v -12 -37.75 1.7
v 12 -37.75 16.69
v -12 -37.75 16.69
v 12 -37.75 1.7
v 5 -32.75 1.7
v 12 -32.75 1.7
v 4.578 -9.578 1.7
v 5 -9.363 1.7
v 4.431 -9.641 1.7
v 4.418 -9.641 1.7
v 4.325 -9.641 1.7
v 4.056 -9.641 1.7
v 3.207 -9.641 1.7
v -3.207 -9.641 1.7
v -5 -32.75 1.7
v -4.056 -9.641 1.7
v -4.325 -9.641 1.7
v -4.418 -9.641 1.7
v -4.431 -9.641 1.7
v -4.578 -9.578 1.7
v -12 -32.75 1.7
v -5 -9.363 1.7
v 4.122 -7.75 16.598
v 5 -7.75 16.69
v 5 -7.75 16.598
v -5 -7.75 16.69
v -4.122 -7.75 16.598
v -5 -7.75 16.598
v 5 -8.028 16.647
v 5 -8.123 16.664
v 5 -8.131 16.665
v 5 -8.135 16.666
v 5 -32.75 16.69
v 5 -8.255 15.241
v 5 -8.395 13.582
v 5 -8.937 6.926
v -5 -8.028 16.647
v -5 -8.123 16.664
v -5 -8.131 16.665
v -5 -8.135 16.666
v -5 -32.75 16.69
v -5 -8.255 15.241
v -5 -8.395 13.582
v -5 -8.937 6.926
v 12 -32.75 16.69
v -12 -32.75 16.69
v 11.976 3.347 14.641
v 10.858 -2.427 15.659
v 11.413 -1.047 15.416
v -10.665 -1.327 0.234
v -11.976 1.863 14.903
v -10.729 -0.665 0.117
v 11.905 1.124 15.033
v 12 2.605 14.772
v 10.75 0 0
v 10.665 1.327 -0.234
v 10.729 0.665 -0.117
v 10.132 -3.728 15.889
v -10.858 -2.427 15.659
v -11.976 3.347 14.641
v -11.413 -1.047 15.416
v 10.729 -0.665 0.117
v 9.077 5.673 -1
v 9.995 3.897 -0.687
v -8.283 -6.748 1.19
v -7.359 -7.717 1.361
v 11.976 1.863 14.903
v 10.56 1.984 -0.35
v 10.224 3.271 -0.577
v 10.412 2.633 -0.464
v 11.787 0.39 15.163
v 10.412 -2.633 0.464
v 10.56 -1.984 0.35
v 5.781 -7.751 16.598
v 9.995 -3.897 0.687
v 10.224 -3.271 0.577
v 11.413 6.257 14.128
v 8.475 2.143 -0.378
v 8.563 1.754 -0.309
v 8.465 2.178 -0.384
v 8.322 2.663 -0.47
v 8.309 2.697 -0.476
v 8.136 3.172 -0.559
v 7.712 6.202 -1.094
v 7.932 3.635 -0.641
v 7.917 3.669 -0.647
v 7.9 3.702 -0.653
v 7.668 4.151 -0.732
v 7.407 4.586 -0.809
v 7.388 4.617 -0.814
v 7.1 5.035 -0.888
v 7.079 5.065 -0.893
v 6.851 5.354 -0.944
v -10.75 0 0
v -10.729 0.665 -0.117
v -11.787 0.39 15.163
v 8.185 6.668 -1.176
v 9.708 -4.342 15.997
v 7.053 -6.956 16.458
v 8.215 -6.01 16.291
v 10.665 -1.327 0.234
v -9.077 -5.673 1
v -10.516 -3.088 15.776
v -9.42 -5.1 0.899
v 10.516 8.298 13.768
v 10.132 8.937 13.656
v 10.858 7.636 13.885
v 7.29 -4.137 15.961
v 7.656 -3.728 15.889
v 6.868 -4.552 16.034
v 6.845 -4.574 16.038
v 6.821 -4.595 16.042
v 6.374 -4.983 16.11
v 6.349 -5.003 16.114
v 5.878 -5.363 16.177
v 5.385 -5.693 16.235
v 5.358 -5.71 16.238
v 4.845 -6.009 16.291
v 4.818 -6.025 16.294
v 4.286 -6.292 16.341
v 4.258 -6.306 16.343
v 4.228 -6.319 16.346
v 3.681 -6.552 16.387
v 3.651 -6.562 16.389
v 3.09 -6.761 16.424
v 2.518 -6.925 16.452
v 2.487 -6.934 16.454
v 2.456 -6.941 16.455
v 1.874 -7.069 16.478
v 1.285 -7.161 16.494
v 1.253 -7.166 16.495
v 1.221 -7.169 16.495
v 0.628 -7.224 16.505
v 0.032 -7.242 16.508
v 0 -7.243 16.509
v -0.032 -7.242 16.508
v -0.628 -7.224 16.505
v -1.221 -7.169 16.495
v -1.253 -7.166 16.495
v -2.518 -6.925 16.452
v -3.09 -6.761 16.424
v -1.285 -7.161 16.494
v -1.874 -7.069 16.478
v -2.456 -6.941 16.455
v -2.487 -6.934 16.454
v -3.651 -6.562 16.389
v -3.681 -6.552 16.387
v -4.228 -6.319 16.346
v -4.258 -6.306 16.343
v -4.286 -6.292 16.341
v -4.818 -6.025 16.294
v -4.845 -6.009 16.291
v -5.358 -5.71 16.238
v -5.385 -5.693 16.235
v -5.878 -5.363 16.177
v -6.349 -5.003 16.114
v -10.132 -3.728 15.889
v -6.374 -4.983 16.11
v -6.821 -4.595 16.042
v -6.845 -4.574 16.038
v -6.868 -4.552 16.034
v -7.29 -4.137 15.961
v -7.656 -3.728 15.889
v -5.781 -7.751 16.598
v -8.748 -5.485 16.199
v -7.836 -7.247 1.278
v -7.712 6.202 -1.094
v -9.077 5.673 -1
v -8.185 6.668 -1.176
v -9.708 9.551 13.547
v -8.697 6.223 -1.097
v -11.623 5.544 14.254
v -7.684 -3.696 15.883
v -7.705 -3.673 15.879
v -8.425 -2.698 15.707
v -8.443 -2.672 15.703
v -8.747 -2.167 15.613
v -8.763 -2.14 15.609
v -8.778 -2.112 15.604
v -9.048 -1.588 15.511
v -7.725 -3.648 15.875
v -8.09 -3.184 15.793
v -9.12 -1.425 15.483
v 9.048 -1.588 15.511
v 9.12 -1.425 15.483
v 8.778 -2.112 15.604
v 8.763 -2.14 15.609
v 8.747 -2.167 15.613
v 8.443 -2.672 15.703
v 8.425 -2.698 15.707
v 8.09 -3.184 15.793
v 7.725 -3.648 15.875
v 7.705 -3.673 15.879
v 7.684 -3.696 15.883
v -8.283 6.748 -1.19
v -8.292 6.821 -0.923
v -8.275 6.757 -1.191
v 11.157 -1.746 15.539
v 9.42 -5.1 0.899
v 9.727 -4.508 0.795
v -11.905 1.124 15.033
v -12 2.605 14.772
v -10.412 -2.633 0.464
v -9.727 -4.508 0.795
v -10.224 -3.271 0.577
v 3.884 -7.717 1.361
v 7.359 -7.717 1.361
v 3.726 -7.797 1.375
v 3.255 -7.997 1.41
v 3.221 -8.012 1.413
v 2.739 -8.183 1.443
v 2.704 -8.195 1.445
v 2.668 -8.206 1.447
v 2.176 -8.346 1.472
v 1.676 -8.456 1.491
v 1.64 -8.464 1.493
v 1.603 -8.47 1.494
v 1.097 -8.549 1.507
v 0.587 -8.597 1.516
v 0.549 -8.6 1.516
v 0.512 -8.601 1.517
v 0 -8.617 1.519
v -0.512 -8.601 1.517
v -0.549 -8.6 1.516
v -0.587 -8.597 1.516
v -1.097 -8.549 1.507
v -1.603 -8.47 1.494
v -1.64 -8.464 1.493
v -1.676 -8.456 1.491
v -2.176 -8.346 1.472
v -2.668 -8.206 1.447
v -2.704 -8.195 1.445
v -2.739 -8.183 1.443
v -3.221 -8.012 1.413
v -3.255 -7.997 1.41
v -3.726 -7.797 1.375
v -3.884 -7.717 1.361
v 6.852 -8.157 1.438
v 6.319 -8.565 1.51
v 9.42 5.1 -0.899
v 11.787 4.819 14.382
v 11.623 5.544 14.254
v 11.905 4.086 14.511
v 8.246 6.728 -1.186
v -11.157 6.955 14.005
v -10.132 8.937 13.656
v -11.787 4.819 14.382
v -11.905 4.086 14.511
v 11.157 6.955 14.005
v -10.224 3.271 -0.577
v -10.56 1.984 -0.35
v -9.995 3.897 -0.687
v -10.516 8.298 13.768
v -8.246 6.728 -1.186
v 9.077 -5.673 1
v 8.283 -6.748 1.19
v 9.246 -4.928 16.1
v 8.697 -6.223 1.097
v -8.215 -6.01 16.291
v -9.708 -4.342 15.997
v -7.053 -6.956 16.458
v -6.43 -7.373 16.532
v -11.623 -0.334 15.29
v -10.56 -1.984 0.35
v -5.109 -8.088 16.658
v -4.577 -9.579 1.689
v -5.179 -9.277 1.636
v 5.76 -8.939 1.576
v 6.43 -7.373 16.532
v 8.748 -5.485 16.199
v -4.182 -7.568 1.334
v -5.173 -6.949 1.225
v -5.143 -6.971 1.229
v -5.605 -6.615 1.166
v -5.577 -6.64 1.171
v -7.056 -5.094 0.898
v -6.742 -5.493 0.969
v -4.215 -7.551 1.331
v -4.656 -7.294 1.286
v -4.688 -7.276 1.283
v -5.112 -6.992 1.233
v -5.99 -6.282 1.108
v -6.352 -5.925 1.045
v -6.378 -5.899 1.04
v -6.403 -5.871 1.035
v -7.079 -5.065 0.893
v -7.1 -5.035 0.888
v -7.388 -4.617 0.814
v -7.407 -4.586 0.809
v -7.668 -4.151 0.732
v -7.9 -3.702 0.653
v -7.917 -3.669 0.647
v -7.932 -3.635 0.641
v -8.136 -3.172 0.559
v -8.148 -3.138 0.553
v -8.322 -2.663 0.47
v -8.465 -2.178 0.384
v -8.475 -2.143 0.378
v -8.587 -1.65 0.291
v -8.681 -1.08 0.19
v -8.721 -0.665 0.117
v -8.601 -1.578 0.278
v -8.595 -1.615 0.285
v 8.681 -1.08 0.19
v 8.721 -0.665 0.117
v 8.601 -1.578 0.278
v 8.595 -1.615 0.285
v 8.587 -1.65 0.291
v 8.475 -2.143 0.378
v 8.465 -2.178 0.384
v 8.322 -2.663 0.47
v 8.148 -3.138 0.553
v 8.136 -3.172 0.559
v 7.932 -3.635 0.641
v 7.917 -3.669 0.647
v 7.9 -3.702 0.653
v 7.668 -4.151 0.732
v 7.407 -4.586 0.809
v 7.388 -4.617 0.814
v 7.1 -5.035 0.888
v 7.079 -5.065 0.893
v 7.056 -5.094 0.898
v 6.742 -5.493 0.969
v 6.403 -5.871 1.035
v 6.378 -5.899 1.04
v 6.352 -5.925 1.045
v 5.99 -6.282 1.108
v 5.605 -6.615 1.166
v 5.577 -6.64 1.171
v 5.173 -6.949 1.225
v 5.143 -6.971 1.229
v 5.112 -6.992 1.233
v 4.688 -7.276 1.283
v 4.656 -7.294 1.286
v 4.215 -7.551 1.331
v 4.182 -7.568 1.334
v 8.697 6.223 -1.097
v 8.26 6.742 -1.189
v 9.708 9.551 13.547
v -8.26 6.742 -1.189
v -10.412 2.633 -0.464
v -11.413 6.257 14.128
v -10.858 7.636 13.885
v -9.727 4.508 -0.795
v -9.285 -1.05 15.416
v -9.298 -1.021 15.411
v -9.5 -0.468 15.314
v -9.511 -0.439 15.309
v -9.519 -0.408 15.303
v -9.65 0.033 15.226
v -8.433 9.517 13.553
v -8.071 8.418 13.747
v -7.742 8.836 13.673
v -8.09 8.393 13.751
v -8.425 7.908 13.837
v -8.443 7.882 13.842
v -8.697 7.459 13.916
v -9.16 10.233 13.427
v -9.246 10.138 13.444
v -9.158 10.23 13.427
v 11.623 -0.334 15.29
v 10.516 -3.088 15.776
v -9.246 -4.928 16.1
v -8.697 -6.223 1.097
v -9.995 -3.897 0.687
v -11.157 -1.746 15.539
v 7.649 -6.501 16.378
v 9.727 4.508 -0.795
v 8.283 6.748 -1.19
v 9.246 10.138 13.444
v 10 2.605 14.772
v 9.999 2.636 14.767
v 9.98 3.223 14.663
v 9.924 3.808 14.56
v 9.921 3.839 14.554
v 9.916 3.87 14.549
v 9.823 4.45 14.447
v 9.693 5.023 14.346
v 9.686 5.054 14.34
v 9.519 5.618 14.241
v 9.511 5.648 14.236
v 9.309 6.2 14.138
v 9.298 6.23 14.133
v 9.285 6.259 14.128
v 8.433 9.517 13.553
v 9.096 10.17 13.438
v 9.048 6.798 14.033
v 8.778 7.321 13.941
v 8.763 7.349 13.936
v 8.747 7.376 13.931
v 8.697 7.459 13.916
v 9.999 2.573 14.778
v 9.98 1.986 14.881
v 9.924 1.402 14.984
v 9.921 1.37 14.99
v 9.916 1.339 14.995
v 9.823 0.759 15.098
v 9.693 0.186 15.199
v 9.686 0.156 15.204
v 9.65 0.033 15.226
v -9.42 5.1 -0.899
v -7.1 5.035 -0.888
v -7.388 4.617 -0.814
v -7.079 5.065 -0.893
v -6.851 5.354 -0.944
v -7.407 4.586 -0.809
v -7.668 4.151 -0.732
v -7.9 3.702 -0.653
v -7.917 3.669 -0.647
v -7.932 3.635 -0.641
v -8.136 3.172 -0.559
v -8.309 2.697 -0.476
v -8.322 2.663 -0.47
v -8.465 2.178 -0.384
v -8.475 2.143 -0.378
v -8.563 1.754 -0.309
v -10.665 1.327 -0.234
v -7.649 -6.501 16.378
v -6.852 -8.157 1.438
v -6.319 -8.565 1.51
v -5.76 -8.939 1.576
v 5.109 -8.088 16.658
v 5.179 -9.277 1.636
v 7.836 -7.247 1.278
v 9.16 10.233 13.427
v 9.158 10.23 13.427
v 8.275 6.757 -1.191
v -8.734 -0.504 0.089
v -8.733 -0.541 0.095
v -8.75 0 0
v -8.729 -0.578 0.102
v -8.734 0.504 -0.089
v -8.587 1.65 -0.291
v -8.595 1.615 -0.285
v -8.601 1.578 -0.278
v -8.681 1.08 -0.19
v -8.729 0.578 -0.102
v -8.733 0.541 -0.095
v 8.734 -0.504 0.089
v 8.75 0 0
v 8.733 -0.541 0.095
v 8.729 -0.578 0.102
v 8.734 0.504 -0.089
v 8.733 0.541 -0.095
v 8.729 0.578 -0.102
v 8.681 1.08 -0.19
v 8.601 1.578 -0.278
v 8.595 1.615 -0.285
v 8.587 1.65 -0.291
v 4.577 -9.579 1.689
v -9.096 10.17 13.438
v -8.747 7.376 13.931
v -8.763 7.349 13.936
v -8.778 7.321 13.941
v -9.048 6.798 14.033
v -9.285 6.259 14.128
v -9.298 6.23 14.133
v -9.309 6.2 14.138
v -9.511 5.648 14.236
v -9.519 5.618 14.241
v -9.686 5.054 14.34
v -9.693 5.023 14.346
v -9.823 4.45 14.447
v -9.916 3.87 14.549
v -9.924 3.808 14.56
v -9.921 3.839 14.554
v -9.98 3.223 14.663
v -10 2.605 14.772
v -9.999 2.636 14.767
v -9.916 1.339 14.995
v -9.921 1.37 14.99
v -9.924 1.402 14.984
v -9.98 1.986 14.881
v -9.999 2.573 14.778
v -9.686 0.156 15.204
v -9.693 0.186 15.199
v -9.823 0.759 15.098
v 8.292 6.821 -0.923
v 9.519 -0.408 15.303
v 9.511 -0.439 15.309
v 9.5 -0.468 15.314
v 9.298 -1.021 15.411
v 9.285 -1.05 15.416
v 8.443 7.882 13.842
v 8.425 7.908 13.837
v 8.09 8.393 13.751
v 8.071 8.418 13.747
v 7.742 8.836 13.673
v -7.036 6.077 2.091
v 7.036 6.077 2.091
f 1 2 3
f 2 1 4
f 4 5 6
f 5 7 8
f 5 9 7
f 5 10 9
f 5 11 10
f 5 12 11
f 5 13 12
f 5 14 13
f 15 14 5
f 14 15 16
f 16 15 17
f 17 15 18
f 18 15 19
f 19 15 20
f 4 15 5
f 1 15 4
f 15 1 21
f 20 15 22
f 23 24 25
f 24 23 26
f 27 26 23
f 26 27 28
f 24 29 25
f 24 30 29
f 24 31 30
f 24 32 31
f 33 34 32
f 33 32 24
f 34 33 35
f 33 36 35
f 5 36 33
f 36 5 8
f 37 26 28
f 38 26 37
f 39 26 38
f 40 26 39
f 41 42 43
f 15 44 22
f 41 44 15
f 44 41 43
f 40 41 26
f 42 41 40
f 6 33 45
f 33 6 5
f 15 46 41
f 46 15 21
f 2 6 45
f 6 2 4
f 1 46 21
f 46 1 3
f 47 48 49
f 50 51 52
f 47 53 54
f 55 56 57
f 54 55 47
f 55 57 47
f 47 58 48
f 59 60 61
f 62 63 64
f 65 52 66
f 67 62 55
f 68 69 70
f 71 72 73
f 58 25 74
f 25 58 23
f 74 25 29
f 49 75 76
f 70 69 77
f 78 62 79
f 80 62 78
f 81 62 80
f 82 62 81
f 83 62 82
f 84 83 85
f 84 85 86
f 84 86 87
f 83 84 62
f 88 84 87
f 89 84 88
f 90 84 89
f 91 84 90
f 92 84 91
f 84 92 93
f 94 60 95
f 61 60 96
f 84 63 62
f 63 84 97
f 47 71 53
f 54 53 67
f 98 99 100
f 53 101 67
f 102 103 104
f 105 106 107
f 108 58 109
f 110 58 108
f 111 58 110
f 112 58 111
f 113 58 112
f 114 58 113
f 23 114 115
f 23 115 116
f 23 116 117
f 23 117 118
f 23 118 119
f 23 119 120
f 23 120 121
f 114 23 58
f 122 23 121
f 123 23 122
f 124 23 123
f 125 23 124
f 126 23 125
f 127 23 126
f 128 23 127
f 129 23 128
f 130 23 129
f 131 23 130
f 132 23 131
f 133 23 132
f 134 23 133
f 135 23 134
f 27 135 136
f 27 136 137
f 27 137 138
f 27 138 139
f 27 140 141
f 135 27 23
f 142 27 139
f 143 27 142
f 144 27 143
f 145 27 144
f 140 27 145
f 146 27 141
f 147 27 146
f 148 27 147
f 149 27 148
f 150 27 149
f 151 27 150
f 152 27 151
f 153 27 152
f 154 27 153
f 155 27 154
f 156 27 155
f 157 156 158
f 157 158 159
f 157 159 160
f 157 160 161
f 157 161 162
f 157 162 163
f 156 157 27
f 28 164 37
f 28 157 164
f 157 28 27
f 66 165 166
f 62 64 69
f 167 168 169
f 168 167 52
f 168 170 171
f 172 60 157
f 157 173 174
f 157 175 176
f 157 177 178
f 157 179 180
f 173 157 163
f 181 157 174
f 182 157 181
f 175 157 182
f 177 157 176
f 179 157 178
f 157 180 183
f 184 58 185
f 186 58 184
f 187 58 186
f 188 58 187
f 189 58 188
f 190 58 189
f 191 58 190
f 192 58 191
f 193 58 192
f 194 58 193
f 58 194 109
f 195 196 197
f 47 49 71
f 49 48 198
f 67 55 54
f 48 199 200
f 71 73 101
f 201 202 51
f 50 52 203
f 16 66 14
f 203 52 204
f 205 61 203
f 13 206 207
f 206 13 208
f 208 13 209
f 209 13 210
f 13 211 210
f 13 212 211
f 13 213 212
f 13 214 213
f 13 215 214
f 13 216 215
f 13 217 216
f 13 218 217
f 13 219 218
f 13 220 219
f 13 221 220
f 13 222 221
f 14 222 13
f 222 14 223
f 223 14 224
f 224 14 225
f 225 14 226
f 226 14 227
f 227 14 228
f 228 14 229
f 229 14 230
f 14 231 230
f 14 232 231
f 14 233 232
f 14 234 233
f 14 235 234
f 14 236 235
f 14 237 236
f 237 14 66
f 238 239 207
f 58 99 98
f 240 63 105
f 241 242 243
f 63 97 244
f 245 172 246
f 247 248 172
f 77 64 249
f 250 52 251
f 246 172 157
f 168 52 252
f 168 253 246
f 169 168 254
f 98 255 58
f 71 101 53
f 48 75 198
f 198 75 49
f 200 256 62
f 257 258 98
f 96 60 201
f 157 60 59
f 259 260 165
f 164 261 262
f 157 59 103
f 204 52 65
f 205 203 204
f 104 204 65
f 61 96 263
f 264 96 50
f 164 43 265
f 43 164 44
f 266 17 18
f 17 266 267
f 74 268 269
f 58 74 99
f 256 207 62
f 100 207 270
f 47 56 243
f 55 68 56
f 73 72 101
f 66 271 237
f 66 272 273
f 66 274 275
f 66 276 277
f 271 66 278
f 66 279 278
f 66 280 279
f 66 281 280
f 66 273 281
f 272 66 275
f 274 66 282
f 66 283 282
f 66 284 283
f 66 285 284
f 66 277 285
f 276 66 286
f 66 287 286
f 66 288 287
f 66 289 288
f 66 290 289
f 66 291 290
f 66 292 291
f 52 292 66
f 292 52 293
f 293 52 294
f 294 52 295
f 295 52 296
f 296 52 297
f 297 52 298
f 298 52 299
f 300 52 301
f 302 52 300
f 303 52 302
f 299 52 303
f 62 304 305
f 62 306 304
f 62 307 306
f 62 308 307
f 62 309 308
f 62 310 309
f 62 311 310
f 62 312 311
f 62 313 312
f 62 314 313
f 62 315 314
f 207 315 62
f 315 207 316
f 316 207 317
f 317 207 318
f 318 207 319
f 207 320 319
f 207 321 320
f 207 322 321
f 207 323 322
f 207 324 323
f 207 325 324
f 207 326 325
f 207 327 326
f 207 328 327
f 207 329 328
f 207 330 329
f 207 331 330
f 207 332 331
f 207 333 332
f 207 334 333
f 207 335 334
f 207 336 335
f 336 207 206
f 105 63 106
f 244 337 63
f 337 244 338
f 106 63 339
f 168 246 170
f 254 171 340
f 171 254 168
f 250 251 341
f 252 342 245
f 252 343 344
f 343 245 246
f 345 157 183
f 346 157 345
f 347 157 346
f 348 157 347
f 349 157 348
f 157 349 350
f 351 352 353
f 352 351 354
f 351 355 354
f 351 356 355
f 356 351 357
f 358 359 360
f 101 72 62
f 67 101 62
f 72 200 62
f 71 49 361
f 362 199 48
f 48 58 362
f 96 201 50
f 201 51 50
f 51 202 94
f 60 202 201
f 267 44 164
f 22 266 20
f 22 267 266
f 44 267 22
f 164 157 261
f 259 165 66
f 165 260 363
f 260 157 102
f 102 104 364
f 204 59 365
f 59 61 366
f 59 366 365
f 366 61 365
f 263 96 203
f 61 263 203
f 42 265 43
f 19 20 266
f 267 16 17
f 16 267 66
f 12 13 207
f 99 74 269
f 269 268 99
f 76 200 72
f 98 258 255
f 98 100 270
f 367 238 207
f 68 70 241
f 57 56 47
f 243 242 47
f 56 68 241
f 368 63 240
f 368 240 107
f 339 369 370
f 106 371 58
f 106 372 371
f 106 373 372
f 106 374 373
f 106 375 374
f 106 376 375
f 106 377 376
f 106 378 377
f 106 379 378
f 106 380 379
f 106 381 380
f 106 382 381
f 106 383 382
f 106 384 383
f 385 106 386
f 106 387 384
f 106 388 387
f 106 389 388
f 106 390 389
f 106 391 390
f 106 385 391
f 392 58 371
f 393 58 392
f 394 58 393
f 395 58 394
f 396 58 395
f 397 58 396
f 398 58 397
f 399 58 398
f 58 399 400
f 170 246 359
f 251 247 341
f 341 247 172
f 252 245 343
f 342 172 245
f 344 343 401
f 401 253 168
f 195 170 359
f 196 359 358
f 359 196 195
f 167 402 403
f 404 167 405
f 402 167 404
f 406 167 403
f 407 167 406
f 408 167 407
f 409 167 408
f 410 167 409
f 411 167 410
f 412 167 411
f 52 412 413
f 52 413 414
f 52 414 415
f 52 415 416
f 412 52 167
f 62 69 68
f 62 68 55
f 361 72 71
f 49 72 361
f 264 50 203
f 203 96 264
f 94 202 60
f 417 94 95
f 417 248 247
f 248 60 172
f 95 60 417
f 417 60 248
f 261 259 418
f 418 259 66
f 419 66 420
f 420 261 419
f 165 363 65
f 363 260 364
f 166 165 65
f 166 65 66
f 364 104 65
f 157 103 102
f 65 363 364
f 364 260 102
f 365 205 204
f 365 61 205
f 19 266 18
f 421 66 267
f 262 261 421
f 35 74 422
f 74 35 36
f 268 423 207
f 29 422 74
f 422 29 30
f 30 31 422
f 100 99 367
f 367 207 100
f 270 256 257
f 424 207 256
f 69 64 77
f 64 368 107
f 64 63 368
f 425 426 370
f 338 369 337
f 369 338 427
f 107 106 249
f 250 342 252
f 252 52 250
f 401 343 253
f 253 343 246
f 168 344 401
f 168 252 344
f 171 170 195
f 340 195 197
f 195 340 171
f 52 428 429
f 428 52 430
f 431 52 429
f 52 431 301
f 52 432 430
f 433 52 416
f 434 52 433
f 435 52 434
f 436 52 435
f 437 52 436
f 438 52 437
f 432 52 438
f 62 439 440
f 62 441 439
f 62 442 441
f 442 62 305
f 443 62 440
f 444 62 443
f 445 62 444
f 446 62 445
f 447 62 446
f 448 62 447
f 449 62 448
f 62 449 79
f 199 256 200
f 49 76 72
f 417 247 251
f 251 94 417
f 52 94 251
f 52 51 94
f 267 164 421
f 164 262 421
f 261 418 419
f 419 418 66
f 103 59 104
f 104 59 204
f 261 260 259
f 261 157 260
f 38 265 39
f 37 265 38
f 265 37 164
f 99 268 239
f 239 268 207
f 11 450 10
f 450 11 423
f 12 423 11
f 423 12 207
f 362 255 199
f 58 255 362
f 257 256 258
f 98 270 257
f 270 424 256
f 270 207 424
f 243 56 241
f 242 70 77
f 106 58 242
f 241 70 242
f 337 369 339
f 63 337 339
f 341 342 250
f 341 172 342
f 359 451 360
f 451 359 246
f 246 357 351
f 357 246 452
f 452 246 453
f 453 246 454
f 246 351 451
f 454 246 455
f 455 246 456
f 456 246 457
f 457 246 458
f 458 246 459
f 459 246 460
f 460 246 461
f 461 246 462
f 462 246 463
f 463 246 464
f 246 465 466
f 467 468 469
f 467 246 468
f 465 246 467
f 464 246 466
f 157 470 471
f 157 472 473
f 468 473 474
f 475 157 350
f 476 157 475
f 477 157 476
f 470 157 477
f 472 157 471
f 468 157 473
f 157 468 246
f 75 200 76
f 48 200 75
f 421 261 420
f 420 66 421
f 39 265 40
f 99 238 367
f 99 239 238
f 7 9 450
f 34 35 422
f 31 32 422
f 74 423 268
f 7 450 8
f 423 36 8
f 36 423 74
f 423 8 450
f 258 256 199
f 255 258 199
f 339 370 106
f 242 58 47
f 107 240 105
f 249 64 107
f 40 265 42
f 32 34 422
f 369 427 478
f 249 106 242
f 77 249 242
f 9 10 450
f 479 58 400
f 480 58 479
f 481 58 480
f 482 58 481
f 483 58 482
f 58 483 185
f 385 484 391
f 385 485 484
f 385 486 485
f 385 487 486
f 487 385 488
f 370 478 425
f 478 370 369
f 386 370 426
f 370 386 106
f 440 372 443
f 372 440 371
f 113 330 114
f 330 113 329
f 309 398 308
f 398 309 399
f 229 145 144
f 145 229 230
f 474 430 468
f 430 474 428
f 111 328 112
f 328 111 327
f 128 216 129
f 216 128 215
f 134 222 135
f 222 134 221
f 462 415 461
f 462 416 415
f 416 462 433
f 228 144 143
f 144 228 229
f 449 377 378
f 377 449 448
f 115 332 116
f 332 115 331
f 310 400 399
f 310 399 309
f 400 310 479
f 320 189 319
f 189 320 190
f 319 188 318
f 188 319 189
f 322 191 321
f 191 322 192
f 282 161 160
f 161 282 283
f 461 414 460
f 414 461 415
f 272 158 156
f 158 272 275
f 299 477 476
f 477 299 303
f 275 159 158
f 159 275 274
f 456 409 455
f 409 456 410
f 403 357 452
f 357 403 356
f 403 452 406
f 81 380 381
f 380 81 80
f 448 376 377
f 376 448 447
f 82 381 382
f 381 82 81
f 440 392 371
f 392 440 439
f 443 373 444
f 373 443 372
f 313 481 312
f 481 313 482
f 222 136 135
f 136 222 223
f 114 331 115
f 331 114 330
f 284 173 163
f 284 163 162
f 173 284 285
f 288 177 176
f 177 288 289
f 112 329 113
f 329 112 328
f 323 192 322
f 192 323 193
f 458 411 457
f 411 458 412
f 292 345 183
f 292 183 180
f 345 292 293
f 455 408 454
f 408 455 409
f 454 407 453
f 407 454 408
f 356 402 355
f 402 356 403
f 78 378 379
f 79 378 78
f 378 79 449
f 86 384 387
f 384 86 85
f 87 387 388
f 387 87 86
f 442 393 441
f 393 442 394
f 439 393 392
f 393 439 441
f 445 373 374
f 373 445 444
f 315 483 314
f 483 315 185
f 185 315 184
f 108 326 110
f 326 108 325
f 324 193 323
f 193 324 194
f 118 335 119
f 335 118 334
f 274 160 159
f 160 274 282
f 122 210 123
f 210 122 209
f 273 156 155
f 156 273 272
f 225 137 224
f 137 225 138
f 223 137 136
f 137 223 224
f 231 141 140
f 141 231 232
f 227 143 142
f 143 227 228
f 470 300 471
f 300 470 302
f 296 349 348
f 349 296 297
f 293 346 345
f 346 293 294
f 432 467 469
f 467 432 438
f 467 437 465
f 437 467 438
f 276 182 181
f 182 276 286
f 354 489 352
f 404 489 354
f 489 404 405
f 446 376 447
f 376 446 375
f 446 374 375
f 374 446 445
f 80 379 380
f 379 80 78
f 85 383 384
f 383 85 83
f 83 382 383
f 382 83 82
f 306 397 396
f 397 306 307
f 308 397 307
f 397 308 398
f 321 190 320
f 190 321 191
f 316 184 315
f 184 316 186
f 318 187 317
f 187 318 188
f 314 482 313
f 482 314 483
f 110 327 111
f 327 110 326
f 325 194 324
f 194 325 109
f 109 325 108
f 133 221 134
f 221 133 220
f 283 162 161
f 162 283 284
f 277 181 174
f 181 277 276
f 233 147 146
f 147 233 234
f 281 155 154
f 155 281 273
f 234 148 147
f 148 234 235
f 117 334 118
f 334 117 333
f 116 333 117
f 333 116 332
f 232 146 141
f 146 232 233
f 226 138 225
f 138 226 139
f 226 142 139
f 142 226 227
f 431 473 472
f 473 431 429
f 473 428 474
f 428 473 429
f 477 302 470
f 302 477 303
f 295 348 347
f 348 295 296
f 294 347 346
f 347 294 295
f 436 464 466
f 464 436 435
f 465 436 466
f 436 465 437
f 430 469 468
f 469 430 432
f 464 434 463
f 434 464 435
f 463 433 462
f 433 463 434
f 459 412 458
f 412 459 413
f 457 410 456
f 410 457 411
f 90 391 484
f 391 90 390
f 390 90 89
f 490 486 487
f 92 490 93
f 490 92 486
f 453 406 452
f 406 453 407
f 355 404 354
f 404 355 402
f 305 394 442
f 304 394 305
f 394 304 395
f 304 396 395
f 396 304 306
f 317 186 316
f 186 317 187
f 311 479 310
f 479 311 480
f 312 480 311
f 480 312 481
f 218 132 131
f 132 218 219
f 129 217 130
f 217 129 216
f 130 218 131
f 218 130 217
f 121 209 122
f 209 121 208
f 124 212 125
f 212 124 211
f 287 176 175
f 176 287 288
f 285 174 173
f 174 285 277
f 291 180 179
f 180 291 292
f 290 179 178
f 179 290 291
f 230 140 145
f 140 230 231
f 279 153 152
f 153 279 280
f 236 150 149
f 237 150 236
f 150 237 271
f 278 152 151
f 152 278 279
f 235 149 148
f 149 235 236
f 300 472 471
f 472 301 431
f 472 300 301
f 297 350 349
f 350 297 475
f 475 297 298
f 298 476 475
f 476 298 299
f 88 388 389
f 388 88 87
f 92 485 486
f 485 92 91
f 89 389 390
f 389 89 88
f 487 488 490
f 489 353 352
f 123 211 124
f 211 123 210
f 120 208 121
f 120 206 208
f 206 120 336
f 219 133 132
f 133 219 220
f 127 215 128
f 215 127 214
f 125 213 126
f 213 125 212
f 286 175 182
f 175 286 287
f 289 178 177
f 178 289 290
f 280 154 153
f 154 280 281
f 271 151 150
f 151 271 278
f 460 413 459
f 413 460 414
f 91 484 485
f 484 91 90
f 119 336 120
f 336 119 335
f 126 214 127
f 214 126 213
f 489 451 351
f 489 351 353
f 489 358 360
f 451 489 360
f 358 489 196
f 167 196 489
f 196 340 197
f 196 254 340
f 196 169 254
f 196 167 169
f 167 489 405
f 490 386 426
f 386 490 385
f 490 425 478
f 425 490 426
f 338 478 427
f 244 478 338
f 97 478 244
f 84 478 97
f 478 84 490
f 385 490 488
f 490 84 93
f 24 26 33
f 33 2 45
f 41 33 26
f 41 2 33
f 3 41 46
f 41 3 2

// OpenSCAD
d_small = 17.5;
d_large = 20;
h = 15;
wall = 2;
lin_rate = ( d_large - d_small ) / h;
tilt = -10;

difference(){
    union(){
        rotate( tilt, [ 1, 0, 0 ] )
            cylinder( d1 = d_small + 2 * wall, d2 = d_large + 2 * wall, h = h, $fn = 100 );
        rotate( -90, [ 0, 0, 1 ] )
        {
            translate( [ d_small / 2.0 - 1, -5, 1.7 ] )
            {
                cube( [ 30, 10, h ] );
                translate( [ 25, -( d_large / 2 + wall ) + 5, 0 ] )
                    cube( [ 5, d_large + 2 * wall, h ] );
            }
        }
    }
    rotate( tilt, [ 1, 0, 0 ] )
        translate( [ 0, 0, -1 ] )
            cylinder( d1 = d_small - lin_rate, d2 = d_large + lin_rate, h = h + 2, $fn = 100 );
    rotate( tilt, [ 1, 0, 0 ] )
        rotate( 45, [ 0, 0, 1 ] )
            translate( [ -1, -1, -50 ] )
                cube( [ 100, 100, 100 ] );
    translate( [ -50, -50, h + 1.7 - 0.01 ] )
        cube( [ 100, 100, 100 ] );
}
